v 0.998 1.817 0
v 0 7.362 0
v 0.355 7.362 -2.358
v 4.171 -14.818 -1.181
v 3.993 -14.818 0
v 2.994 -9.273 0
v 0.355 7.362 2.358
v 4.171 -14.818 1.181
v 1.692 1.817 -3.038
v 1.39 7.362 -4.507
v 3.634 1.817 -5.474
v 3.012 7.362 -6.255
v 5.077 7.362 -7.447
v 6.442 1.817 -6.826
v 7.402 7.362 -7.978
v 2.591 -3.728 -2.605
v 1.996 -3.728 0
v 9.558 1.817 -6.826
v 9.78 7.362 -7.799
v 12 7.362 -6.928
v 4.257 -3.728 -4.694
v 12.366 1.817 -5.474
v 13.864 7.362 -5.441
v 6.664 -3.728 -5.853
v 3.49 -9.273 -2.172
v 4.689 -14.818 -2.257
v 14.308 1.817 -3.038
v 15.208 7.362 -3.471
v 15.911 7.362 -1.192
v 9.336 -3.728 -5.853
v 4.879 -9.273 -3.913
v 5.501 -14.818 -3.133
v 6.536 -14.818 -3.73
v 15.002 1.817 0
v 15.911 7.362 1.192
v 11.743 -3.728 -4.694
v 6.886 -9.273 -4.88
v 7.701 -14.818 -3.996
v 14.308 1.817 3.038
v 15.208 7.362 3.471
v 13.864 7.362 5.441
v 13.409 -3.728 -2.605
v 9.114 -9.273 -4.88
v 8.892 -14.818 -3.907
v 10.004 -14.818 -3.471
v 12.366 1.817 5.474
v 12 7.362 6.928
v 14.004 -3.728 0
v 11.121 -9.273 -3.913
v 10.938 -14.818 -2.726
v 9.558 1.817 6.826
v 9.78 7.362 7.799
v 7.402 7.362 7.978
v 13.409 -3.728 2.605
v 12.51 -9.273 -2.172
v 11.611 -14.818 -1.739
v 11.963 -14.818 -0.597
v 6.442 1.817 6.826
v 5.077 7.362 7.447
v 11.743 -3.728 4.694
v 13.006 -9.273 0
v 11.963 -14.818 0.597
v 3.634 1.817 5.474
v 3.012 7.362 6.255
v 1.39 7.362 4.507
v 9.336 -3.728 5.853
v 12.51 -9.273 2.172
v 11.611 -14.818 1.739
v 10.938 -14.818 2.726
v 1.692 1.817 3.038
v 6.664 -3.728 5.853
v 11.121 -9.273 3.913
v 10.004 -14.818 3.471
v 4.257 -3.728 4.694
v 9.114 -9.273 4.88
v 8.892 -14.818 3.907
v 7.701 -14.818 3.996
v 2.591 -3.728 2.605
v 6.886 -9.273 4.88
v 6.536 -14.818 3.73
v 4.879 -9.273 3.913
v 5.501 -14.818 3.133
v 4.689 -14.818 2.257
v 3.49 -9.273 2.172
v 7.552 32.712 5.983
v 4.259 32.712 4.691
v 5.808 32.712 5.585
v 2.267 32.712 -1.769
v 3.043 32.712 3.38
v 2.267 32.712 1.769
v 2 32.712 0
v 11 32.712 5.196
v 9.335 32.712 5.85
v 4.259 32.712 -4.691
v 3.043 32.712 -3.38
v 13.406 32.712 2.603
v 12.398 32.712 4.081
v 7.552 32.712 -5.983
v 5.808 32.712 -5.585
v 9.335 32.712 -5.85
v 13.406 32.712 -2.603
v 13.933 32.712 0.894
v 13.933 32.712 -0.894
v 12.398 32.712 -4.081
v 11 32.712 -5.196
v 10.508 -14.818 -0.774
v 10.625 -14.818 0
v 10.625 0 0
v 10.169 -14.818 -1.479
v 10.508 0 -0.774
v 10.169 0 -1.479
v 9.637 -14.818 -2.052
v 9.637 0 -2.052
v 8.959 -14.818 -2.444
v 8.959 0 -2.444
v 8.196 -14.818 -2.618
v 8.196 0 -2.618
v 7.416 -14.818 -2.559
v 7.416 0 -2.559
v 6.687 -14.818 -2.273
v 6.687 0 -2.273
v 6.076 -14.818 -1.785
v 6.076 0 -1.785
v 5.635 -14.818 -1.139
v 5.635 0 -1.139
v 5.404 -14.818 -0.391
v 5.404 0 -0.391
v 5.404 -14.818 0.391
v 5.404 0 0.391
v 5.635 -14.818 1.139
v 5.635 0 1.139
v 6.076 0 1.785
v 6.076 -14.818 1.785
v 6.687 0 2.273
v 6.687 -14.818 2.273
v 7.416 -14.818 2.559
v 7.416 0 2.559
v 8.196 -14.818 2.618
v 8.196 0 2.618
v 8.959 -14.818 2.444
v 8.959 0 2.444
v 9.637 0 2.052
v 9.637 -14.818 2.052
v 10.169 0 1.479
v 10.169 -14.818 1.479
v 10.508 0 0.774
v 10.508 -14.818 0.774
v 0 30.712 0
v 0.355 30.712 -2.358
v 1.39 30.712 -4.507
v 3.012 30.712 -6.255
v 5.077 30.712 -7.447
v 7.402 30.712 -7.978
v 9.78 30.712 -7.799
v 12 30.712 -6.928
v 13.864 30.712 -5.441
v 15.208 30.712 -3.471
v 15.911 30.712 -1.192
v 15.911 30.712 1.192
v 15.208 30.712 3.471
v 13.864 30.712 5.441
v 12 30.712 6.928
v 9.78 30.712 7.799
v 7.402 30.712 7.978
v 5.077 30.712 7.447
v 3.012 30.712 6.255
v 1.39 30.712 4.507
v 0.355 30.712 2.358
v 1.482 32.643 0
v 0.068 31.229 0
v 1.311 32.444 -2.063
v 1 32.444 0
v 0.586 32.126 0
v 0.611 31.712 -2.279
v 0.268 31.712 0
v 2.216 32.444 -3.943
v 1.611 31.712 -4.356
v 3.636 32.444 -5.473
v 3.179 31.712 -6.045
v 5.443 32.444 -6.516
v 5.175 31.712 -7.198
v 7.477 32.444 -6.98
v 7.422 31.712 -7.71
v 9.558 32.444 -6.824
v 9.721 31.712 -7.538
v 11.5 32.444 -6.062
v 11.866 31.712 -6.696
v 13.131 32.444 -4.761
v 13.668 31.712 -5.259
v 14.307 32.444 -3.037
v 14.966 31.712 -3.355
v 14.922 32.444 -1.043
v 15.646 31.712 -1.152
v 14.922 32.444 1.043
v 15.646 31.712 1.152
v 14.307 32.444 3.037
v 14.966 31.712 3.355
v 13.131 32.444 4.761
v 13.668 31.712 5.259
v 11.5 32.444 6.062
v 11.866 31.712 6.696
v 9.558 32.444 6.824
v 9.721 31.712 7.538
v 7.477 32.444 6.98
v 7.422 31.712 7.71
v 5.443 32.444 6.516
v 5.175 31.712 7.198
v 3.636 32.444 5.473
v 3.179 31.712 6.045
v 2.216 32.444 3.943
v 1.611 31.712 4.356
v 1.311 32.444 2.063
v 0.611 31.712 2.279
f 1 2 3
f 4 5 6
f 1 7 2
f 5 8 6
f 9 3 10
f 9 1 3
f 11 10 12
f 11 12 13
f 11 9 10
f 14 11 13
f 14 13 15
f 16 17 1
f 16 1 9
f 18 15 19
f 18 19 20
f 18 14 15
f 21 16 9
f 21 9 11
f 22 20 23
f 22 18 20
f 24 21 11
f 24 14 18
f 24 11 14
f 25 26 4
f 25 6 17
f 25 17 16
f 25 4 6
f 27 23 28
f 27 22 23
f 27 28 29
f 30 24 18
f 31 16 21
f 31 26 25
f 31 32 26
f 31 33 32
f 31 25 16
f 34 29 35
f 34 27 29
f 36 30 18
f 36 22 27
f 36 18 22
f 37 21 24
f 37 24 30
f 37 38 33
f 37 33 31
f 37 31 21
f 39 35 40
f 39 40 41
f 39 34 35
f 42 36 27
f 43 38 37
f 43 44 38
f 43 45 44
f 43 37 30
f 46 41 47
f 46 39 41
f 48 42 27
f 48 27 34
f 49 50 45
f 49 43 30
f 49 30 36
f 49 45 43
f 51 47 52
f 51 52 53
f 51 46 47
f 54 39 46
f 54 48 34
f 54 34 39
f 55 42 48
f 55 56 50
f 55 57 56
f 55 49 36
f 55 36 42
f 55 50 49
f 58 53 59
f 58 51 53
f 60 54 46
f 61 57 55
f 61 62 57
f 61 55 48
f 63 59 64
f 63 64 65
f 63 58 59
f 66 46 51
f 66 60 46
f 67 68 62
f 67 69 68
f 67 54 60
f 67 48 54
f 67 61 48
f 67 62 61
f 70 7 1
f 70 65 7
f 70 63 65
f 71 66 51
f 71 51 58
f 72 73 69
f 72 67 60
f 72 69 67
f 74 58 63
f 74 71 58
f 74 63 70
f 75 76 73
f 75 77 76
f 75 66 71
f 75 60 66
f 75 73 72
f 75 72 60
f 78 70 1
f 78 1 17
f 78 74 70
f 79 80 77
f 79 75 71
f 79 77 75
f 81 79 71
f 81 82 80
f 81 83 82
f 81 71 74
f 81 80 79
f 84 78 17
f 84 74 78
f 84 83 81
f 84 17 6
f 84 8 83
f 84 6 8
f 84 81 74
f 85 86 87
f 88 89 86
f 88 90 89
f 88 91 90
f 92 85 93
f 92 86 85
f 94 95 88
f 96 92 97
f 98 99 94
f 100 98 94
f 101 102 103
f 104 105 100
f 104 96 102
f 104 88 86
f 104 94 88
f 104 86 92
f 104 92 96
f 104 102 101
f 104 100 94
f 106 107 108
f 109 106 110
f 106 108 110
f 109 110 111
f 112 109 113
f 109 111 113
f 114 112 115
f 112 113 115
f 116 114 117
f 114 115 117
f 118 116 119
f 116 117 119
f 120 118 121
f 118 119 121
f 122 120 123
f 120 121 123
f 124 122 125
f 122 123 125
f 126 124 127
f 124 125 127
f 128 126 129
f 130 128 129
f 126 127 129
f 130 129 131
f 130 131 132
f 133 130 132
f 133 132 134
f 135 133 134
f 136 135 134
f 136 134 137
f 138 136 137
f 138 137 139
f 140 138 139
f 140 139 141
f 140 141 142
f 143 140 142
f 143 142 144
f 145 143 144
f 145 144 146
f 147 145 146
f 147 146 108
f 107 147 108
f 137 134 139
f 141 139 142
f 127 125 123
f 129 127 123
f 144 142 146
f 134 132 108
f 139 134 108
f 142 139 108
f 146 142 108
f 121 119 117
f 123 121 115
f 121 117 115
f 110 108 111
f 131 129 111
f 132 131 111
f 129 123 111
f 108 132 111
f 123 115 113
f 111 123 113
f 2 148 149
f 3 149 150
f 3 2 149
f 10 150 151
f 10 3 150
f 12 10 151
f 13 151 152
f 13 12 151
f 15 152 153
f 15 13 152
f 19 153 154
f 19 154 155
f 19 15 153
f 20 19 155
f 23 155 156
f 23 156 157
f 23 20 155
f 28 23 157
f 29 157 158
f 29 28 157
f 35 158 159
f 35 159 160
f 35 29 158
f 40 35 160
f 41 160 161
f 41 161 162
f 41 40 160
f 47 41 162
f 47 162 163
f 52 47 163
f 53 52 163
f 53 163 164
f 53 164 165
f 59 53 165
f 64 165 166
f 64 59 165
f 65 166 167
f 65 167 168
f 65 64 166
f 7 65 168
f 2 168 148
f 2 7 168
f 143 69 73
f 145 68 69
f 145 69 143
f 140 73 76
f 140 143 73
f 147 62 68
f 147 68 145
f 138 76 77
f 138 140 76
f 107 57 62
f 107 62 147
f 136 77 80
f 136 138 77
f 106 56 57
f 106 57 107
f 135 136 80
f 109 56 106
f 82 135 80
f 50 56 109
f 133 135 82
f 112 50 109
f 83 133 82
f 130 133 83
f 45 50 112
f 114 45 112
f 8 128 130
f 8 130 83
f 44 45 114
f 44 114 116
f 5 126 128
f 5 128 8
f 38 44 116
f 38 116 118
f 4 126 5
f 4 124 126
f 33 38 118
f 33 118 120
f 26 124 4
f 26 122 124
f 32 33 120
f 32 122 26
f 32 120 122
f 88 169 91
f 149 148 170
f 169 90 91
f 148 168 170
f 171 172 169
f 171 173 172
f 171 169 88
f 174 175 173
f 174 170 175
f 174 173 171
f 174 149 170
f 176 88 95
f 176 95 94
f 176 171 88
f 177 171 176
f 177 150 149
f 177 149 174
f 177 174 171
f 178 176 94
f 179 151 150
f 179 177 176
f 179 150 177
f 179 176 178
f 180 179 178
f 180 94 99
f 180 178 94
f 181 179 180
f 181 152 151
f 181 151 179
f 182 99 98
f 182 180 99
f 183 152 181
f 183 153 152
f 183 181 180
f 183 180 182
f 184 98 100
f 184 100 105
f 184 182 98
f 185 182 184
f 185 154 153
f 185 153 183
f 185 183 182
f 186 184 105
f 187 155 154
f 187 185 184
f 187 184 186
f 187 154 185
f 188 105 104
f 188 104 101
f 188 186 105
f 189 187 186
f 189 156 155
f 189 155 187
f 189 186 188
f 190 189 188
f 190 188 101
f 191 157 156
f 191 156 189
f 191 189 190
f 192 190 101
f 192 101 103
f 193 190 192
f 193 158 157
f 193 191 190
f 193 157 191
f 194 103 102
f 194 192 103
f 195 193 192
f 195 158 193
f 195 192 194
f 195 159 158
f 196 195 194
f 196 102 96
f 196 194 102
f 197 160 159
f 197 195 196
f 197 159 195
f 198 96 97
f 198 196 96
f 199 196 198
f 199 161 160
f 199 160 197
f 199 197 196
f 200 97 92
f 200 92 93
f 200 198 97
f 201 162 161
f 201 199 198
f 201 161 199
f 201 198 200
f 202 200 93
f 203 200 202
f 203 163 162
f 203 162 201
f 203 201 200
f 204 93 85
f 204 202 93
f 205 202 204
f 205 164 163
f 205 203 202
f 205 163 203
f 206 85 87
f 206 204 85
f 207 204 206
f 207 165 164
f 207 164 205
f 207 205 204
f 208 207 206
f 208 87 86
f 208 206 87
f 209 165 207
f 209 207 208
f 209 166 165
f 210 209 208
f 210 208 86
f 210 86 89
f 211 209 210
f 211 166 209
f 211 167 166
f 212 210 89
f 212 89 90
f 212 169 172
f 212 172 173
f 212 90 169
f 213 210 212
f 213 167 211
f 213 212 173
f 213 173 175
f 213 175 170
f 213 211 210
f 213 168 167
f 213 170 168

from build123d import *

# Parameters (mm, degrees)
F3_R     = 2
F5_D     = 5.25
F5_DEPTH = 14.8190481046


with BuildPart() as f2:
    # F0 (on Top) → F2 (revolve)
    with BuildSketch(Plane.XY):
        Polygon((0, -14.8180481046), (0, 32.7115394175), (-8, 32.7115394175), (-8, 7.3624262586), (-4.0073962882, -14.8180481046), align=None)
    revolve(axis=Axis((0, 8.853550069, 0), (0, -1, 0)))

    # F3
    f3_edges = [f2.edges().sort_by_distance(p)[0] for p in [
        (8, 32.711539, 0),
    ]]
    fillet(f3_edges, radius=F3_R)

    # F5 (through all, one way)
    with BuildSketch(Plane(origin=(0, 0, 0), x_dir=(1, 0, 0), z_dir=(0, 1, 0))):
        with Locations((0, 0)):
            Circle(F5_D / 2)
    extrude(amount=-F5_DEPTH, mode=Mode.SUBTRACT)


with BuildPart() as f2_1:
    # F6: moved
    add(f2.part.moved(Location((8, 0, 0))))


solid = f2_1.part
